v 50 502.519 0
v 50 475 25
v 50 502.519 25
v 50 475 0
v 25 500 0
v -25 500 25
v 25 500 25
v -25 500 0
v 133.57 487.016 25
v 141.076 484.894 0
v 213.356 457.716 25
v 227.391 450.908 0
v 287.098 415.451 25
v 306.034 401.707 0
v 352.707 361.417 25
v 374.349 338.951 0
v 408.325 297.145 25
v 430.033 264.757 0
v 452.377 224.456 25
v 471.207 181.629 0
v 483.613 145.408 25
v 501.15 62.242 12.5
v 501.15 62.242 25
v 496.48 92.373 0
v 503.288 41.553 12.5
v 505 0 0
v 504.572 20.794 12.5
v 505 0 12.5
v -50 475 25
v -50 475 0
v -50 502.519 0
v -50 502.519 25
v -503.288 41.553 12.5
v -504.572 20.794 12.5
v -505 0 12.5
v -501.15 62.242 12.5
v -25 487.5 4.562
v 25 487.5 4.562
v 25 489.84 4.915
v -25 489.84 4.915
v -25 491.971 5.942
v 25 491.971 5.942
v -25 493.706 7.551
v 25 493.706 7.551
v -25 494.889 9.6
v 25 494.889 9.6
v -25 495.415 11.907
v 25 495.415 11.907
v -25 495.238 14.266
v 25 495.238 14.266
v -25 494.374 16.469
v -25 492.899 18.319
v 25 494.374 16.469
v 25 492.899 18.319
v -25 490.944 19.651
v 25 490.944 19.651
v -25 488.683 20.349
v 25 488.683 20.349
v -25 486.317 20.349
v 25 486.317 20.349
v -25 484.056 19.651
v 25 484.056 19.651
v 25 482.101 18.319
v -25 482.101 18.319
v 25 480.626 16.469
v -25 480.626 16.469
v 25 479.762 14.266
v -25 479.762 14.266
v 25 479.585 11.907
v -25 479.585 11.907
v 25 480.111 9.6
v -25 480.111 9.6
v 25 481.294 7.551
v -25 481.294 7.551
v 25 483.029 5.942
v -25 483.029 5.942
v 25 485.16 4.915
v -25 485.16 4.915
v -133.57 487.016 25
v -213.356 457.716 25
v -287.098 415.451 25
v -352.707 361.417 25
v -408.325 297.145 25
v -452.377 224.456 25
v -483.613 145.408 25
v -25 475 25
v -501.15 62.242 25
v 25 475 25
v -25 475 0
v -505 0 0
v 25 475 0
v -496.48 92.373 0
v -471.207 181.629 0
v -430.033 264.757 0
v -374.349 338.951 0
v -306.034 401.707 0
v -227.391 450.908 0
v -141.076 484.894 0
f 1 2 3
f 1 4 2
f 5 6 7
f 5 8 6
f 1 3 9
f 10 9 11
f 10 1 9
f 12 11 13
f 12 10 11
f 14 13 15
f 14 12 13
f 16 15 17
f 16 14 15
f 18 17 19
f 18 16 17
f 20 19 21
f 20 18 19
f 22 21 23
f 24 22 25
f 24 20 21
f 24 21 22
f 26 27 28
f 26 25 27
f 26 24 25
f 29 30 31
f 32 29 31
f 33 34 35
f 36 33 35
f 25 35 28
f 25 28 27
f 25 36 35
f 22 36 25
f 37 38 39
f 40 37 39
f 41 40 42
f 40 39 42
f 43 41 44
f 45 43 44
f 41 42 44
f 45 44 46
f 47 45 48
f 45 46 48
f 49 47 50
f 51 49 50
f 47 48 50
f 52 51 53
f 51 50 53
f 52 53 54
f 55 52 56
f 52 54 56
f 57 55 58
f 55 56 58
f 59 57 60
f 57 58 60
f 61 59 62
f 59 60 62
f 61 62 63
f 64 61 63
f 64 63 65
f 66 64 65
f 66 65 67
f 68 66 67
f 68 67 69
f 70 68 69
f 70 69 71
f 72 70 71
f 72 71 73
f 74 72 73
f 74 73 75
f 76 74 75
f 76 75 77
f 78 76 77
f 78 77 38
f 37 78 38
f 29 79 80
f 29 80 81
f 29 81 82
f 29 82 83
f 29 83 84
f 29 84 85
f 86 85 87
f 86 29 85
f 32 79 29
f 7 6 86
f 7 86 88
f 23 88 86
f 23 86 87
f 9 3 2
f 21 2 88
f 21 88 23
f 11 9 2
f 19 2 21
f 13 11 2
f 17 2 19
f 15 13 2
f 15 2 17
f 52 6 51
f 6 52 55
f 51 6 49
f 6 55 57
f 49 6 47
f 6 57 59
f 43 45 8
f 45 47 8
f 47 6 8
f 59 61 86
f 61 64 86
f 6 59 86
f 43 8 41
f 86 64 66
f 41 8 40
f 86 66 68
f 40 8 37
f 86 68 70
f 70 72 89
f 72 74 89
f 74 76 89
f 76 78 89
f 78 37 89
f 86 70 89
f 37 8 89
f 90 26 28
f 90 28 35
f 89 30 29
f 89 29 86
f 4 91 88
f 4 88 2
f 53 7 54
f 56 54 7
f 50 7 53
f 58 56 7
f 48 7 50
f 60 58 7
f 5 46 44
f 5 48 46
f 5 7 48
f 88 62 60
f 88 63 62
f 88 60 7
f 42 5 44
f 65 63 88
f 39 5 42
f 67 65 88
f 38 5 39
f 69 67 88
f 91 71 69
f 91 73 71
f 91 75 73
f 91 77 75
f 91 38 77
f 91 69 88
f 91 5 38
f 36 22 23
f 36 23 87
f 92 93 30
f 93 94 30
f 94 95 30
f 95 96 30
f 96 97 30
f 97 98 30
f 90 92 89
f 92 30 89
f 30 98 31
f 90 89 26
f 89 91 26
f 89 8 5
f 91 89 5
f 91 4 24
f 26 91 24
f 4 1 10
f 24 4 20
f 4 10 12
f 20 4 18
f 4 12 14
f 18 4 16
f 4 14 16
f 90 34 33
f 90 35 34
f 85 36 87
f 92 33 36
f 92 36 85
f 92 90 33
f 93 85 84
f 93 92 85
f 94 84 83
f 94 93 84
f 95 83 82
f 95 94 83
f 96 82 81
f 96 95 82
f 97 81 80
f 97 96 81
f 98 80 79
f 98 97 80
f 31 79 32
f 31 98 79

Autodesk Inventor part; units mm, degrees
ref_plane "YZ Plane" through (0, 0, 0) normal (1, 0, 0) x (0, 1, 0)
ref_plane "XZ Plane" through (0, 0, 0) normal (0, 1, 0) x (-1, 0, 0)
ref_plane "XY Plane" through (0, 0, 0) normal (0, 0, 1) x (1, 0, 0)
sketch "Sketch4" plane through (0, 0, 0) normal (0, 0, 1) x (1, 0, 0)
  circle A0 centre (0, 0) radius 505
  line L0 (0, 0) -> (0, 505)
  line L1 (0, 505) -> (0, 500)
  line L2 (0, 500) -> (25, 500)
  line L3 (0, 500) -> (-25, 500)
  line L4 (-25, 500) -> (-25, 450)
  line L5 (25, 500) -> (25, 450)
  line L6 (25, 450) -> (50, 450)
  line L7 (50, 450) -> (50, 502.5187)
  line L8 (-25, 450) -> (-50, 450)
  line L9 (-50, 450) -> (-50, 502.5187)
  line L10 (505, 0) -> (-505, 0)
  line L11 (-505, 0) -> (505, 0)
  line L12 (505, 0) -> (505, 62.2415)
  line L13 (505, 62.2415) -> (-505, 62.2415)
  line L14 (-505, 62.2415) -> (-505, 0)
  point P0 (-501.1497, 62.2415)
  point P1 (501.1497, 62.2415)
  dimension "d17" = 1010
  dimension "d18" = 5
  dimension "d19" = 25
  dimension "d20" = 25
  dimension "d22" = 50
  dimension "d23" = 50
  dimension "d24" = 25
  dimension "d25" = 25
  dimension "d36" = 62.2415
extrude "Extrusion4" add sketch "Sketch4" along normal blind 25 contours A0 L13 L0 L2 L5 L6 L7 | L9 L8 L4 L3 L0 L13 A0
sketch "Sketch5" plane through (25, 450, 0) normal (1, 0, 0) x (0, 0, -1)
  line L0 (-25, 0) -> (-25, 50) projected
  line L1 (-25, 50) -> (-12.5, 50) construction
  line L2 (0, 50) -> (-25, 50) projected
  line L3 (-12.5, 50) -> (-12.5, 37.5) construction
  circle A0 centre (-12.5, 37.5) radius 7.9375
  point P0 (0, -450)
  dimension "d28" = 12.5
  dimension "d29" = 15.875
extrude "Extrusion5" cut sketch "Sketch5" against normal up to surface (50 mm away)
sketch "Sketch6" plane through (-50, 450, 0) normal (0, 1, 0) x (1, 0, 0)
  line L0 (-455, -25) -> (555, -25) projected
  line L1 (0, 0) -> (0, -25) projected
  line L2 (25, -25) -> (0, -25)
  line L3 (0, -25) -> (0, 0)
  line L4 (0, 0) -> (25, 0)
  line L5 (25, 0) -> (25, -25)
  line L6 (75, 0) -> (100, 0)
  line L7 (100, 0) -> (100, -25)
  line L8 (100, -25) -> (75, -25)
  line L9 (75, -25) -> (75, 0)
  point P0 (50, 0)
extrude "Extrusion6" add sketch "Sketch6" along normal blind 25
extrude "Extrusion8" add sketch "Sketch4" along normal blind 12.5 contours A0 L10 L0 L13 | L0 L10 A0 L13
properties part number "Flap"
